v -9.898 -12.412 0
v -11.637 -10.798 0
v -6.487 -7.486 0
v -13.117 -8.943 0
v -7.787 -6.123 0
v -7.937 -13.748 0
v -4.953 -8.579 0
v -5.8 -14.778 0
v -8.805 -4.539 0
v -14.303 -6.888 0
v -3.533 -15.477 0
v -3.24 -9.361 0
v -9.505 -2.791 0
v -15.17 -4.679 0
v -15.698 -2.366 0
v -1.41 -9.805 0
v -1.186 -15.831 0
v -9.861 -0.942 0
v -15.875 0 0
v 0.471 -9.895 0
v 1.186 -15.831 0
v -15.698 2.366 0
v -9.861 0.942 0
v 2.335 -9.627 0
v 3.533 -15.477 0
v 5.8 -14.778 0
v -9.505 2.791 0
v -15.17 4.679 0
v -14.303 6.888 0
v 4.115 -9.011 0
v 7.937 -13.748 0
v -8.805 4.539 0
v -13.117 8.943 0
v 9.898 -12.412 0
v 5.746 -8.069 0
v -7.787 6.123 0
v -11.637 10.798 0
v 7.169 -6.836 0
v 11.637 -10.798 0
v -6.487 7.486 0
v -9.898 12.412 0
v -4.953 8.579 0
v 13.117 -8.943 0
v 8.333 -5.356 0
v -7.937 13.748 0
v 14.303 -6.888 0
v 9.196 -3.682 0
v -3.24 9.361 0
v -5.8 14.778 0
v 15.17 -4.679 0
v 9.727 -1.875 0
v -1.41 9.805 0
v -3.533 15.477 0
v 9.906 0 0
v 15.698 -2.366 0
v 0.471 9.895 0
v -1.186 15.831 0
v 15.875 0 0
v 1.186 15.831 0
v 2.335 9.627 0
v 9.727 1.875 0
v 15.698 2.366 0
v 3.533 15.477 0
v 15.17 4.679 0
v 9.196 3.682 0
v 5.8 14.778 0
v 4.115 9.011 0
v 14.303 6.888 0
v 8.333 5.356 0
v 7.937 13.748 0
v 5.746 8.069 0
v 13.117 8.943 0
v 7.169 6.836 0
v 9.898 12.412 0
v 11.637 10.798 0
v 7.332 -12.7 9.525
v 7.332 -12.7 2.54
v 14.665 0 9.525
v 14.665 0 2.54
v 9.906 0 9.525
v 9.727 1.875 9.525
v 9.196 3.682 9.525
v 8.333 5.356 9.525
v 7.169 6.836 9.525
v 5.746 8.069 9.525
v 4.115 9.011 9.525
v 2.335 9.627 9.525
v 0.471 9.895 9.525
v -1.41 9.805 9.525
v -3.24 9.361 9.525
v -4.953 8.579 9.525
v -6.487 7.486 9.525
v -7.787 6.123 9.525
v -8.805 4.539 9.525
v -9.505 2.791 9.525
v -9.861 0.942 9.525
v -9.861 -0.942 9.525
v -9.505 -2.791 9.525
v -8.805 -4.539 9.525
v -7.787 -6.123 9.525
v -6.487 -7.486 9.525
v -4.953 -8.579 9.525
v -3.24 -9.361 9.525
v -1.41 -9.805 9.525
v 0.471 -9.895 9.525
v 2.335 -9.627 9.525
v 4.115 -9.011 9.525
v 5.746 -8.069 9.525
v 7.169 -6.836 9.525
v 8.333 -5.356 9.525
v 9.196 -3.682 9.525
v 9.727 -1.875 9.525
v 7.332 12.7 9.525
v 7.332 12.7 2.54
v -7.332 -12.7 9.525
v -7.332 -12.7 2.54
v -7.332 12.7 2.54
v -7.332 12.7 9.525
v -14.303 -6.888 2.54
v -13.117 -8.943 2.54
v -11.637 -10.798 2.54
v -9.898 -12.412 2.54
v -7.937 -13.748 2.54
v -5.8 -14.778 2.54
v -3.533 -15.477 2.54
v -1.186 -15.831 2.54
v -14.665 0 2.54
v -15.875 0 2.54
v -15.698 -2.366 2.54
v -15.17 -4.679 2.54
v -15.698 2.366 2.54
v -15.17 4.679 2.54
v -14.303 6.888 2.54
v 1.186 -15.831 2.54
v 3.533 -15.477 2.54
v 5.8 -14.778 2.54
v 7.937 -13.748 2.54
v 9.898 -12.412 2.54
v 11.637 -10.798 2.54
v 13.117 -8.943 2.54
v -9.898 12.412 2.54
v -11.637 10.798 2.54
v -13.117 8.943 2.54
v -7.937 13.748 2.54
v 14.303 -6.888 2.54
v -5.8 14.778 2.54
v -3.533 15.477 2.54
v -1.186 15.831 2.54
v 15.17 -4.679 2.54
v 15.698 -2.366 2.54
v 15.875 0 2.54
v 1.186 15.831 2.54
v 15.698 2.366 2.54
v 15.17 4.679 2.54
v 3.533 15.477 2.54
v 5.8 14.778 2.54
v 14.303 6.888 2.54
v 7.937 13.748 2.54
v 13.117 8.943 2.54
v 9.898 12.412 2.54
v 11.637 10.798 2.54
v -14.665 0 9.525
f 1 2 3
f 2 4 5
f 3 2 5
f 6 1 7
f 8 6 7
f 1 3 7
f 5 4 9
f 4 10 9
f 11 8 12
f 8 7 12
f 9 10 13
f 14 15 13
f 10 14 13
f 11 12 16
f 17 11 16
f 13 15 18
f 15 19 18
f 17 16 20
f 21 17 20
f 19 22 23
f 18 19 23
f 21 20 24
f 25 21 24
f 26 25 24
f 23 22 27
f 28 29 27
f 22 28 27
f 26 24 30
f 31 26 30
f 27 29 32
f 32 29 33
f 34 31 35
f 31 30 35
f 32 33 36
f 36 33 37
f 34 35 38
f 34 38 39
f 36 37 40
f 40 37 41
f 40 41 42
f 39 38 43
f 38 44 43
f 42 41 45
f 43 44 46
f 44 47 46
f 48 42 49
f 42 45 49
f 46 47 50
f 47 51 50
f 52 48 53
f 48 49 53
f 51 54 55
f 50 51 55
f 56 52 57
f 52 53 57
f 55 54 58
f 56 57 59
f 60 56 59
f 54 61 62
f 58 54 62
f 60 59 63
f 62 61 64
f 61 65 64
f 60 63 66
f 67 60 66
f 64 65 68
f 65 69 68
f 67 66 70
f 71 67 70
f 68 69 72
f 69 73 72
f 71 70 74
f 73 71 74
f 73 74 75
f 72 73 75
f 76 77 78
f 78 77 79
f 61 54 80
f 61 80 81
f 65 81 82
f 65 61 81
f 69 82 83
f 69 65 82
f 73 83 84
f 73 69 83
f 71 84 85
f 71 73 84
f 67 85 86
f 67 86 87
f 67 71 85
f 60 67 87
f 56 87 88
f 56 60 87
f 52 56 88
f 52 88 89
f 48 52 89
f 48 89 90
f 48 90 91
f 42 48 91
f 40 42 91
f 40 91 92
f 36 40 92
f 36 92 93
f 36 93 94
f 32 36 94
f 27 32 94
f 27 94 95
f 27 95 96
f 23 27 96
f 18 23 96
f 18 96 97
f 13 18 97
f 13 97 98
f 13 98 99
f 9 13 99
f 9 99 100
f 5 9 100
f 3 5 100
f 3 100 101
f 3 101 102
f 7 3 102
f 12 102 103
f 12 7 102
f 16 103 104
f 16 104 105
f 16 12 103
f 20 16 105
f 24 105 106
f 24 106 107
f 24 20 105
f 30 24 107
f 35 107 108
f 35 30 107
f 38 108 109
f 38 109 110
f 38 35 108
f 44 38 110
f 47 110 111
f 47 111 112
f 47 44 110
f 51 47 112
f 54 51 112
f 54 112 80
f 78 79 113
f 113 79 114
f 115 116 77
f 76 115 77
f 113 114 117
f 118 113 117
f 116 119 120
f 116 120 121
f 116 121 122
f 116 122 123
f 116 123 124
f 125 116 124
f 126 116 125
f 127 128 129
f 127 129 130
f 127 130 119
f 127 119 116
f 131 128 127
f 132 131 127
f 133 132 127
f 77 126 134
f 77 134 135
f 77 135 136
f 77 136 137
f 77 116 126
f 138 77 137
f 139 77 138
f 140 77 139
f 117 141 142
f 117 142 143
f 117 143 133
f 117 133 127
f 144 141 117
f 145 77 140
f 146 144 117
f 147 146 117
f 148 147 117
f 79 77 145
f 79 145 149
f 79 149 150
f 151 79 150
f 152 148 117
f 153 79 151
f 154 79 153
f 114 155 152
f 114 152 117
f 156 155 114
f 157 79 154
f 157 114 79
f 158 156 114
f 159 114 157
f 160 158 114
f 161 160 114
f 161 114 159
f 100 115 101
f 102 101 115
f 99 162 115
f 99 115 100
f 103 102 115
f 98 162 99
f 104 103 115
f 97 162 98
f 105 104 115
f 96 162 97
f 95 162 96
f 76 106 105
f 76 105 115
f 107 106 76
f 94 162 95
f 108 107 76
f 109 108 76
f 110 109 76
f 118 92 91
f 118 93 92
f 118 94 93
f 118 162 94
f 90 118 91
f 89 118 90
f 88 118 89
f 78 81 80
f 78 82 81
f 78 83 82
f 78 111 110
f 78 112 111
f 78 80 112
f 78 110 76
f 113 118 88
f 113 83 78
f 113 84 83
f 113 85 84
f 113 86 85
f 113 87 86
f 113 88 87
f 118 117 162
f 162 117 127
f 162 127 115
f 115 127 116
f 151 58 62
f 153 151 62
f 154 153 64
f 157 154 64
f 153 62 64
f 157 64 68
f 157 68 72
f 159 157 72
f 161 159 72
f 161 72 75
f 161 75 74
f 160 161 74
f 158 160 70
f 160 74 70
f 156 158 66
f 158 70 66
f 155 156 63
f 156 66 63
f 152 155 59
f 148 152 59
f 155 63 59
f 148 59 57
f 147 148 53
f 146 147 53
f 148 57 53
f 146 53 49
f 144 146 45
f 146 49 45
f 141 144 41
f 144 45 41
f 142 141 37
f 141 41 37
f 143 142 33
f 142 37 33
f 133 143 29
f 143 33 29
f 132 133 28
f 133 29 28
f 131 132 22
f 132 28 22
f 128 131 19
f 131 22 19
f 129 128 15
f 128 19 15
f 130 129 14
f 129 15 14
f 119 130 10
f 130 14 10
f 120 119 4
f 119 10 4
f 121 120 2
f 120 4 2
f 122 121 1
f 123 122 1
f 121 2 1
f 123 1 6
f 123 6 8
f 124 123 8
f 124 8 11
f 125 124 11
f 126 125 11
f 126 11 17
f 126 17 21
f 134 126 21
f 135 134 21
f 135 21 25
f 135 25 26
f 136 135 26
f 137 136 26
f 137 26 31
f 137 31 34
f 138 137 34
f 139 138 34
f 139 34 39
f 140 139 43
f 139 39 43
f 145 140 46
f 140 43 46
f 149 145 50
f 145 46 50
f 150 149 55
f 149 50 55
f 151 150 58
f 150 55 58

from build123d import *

# Parameters (mm, degrees)
F0_R     = 9.906
F1_DEPTH = 9.525
F2_R     = 15.875
F2_R_2   = 9.906
F3_DEPTH = 2.54


with BuildPart() as f1:
    # F0 (on Top) → F1 (new body)
    with BuildSketch(Plane.XY):
        Polygon((7.332348, 12.7), (-7.332348, 12.7), (-14.664697, 0), (-7.332348, -12.7), (7.332348, -12.7), (14.664697, 0), align=None)
        Circle(F0_R, mode=Mode.SUBTRACT)
    extrude(amount=F1_DEPTH)

    # F2 (on Top) → F3 (join)
    with BuildSketch(Plane.XY):
        Circle(F2_R)
        Circle(F2_R_2, mode=Mode.SUBTRACT)
    extrude(amount=F3_DEPTH)


solid = f1.part
